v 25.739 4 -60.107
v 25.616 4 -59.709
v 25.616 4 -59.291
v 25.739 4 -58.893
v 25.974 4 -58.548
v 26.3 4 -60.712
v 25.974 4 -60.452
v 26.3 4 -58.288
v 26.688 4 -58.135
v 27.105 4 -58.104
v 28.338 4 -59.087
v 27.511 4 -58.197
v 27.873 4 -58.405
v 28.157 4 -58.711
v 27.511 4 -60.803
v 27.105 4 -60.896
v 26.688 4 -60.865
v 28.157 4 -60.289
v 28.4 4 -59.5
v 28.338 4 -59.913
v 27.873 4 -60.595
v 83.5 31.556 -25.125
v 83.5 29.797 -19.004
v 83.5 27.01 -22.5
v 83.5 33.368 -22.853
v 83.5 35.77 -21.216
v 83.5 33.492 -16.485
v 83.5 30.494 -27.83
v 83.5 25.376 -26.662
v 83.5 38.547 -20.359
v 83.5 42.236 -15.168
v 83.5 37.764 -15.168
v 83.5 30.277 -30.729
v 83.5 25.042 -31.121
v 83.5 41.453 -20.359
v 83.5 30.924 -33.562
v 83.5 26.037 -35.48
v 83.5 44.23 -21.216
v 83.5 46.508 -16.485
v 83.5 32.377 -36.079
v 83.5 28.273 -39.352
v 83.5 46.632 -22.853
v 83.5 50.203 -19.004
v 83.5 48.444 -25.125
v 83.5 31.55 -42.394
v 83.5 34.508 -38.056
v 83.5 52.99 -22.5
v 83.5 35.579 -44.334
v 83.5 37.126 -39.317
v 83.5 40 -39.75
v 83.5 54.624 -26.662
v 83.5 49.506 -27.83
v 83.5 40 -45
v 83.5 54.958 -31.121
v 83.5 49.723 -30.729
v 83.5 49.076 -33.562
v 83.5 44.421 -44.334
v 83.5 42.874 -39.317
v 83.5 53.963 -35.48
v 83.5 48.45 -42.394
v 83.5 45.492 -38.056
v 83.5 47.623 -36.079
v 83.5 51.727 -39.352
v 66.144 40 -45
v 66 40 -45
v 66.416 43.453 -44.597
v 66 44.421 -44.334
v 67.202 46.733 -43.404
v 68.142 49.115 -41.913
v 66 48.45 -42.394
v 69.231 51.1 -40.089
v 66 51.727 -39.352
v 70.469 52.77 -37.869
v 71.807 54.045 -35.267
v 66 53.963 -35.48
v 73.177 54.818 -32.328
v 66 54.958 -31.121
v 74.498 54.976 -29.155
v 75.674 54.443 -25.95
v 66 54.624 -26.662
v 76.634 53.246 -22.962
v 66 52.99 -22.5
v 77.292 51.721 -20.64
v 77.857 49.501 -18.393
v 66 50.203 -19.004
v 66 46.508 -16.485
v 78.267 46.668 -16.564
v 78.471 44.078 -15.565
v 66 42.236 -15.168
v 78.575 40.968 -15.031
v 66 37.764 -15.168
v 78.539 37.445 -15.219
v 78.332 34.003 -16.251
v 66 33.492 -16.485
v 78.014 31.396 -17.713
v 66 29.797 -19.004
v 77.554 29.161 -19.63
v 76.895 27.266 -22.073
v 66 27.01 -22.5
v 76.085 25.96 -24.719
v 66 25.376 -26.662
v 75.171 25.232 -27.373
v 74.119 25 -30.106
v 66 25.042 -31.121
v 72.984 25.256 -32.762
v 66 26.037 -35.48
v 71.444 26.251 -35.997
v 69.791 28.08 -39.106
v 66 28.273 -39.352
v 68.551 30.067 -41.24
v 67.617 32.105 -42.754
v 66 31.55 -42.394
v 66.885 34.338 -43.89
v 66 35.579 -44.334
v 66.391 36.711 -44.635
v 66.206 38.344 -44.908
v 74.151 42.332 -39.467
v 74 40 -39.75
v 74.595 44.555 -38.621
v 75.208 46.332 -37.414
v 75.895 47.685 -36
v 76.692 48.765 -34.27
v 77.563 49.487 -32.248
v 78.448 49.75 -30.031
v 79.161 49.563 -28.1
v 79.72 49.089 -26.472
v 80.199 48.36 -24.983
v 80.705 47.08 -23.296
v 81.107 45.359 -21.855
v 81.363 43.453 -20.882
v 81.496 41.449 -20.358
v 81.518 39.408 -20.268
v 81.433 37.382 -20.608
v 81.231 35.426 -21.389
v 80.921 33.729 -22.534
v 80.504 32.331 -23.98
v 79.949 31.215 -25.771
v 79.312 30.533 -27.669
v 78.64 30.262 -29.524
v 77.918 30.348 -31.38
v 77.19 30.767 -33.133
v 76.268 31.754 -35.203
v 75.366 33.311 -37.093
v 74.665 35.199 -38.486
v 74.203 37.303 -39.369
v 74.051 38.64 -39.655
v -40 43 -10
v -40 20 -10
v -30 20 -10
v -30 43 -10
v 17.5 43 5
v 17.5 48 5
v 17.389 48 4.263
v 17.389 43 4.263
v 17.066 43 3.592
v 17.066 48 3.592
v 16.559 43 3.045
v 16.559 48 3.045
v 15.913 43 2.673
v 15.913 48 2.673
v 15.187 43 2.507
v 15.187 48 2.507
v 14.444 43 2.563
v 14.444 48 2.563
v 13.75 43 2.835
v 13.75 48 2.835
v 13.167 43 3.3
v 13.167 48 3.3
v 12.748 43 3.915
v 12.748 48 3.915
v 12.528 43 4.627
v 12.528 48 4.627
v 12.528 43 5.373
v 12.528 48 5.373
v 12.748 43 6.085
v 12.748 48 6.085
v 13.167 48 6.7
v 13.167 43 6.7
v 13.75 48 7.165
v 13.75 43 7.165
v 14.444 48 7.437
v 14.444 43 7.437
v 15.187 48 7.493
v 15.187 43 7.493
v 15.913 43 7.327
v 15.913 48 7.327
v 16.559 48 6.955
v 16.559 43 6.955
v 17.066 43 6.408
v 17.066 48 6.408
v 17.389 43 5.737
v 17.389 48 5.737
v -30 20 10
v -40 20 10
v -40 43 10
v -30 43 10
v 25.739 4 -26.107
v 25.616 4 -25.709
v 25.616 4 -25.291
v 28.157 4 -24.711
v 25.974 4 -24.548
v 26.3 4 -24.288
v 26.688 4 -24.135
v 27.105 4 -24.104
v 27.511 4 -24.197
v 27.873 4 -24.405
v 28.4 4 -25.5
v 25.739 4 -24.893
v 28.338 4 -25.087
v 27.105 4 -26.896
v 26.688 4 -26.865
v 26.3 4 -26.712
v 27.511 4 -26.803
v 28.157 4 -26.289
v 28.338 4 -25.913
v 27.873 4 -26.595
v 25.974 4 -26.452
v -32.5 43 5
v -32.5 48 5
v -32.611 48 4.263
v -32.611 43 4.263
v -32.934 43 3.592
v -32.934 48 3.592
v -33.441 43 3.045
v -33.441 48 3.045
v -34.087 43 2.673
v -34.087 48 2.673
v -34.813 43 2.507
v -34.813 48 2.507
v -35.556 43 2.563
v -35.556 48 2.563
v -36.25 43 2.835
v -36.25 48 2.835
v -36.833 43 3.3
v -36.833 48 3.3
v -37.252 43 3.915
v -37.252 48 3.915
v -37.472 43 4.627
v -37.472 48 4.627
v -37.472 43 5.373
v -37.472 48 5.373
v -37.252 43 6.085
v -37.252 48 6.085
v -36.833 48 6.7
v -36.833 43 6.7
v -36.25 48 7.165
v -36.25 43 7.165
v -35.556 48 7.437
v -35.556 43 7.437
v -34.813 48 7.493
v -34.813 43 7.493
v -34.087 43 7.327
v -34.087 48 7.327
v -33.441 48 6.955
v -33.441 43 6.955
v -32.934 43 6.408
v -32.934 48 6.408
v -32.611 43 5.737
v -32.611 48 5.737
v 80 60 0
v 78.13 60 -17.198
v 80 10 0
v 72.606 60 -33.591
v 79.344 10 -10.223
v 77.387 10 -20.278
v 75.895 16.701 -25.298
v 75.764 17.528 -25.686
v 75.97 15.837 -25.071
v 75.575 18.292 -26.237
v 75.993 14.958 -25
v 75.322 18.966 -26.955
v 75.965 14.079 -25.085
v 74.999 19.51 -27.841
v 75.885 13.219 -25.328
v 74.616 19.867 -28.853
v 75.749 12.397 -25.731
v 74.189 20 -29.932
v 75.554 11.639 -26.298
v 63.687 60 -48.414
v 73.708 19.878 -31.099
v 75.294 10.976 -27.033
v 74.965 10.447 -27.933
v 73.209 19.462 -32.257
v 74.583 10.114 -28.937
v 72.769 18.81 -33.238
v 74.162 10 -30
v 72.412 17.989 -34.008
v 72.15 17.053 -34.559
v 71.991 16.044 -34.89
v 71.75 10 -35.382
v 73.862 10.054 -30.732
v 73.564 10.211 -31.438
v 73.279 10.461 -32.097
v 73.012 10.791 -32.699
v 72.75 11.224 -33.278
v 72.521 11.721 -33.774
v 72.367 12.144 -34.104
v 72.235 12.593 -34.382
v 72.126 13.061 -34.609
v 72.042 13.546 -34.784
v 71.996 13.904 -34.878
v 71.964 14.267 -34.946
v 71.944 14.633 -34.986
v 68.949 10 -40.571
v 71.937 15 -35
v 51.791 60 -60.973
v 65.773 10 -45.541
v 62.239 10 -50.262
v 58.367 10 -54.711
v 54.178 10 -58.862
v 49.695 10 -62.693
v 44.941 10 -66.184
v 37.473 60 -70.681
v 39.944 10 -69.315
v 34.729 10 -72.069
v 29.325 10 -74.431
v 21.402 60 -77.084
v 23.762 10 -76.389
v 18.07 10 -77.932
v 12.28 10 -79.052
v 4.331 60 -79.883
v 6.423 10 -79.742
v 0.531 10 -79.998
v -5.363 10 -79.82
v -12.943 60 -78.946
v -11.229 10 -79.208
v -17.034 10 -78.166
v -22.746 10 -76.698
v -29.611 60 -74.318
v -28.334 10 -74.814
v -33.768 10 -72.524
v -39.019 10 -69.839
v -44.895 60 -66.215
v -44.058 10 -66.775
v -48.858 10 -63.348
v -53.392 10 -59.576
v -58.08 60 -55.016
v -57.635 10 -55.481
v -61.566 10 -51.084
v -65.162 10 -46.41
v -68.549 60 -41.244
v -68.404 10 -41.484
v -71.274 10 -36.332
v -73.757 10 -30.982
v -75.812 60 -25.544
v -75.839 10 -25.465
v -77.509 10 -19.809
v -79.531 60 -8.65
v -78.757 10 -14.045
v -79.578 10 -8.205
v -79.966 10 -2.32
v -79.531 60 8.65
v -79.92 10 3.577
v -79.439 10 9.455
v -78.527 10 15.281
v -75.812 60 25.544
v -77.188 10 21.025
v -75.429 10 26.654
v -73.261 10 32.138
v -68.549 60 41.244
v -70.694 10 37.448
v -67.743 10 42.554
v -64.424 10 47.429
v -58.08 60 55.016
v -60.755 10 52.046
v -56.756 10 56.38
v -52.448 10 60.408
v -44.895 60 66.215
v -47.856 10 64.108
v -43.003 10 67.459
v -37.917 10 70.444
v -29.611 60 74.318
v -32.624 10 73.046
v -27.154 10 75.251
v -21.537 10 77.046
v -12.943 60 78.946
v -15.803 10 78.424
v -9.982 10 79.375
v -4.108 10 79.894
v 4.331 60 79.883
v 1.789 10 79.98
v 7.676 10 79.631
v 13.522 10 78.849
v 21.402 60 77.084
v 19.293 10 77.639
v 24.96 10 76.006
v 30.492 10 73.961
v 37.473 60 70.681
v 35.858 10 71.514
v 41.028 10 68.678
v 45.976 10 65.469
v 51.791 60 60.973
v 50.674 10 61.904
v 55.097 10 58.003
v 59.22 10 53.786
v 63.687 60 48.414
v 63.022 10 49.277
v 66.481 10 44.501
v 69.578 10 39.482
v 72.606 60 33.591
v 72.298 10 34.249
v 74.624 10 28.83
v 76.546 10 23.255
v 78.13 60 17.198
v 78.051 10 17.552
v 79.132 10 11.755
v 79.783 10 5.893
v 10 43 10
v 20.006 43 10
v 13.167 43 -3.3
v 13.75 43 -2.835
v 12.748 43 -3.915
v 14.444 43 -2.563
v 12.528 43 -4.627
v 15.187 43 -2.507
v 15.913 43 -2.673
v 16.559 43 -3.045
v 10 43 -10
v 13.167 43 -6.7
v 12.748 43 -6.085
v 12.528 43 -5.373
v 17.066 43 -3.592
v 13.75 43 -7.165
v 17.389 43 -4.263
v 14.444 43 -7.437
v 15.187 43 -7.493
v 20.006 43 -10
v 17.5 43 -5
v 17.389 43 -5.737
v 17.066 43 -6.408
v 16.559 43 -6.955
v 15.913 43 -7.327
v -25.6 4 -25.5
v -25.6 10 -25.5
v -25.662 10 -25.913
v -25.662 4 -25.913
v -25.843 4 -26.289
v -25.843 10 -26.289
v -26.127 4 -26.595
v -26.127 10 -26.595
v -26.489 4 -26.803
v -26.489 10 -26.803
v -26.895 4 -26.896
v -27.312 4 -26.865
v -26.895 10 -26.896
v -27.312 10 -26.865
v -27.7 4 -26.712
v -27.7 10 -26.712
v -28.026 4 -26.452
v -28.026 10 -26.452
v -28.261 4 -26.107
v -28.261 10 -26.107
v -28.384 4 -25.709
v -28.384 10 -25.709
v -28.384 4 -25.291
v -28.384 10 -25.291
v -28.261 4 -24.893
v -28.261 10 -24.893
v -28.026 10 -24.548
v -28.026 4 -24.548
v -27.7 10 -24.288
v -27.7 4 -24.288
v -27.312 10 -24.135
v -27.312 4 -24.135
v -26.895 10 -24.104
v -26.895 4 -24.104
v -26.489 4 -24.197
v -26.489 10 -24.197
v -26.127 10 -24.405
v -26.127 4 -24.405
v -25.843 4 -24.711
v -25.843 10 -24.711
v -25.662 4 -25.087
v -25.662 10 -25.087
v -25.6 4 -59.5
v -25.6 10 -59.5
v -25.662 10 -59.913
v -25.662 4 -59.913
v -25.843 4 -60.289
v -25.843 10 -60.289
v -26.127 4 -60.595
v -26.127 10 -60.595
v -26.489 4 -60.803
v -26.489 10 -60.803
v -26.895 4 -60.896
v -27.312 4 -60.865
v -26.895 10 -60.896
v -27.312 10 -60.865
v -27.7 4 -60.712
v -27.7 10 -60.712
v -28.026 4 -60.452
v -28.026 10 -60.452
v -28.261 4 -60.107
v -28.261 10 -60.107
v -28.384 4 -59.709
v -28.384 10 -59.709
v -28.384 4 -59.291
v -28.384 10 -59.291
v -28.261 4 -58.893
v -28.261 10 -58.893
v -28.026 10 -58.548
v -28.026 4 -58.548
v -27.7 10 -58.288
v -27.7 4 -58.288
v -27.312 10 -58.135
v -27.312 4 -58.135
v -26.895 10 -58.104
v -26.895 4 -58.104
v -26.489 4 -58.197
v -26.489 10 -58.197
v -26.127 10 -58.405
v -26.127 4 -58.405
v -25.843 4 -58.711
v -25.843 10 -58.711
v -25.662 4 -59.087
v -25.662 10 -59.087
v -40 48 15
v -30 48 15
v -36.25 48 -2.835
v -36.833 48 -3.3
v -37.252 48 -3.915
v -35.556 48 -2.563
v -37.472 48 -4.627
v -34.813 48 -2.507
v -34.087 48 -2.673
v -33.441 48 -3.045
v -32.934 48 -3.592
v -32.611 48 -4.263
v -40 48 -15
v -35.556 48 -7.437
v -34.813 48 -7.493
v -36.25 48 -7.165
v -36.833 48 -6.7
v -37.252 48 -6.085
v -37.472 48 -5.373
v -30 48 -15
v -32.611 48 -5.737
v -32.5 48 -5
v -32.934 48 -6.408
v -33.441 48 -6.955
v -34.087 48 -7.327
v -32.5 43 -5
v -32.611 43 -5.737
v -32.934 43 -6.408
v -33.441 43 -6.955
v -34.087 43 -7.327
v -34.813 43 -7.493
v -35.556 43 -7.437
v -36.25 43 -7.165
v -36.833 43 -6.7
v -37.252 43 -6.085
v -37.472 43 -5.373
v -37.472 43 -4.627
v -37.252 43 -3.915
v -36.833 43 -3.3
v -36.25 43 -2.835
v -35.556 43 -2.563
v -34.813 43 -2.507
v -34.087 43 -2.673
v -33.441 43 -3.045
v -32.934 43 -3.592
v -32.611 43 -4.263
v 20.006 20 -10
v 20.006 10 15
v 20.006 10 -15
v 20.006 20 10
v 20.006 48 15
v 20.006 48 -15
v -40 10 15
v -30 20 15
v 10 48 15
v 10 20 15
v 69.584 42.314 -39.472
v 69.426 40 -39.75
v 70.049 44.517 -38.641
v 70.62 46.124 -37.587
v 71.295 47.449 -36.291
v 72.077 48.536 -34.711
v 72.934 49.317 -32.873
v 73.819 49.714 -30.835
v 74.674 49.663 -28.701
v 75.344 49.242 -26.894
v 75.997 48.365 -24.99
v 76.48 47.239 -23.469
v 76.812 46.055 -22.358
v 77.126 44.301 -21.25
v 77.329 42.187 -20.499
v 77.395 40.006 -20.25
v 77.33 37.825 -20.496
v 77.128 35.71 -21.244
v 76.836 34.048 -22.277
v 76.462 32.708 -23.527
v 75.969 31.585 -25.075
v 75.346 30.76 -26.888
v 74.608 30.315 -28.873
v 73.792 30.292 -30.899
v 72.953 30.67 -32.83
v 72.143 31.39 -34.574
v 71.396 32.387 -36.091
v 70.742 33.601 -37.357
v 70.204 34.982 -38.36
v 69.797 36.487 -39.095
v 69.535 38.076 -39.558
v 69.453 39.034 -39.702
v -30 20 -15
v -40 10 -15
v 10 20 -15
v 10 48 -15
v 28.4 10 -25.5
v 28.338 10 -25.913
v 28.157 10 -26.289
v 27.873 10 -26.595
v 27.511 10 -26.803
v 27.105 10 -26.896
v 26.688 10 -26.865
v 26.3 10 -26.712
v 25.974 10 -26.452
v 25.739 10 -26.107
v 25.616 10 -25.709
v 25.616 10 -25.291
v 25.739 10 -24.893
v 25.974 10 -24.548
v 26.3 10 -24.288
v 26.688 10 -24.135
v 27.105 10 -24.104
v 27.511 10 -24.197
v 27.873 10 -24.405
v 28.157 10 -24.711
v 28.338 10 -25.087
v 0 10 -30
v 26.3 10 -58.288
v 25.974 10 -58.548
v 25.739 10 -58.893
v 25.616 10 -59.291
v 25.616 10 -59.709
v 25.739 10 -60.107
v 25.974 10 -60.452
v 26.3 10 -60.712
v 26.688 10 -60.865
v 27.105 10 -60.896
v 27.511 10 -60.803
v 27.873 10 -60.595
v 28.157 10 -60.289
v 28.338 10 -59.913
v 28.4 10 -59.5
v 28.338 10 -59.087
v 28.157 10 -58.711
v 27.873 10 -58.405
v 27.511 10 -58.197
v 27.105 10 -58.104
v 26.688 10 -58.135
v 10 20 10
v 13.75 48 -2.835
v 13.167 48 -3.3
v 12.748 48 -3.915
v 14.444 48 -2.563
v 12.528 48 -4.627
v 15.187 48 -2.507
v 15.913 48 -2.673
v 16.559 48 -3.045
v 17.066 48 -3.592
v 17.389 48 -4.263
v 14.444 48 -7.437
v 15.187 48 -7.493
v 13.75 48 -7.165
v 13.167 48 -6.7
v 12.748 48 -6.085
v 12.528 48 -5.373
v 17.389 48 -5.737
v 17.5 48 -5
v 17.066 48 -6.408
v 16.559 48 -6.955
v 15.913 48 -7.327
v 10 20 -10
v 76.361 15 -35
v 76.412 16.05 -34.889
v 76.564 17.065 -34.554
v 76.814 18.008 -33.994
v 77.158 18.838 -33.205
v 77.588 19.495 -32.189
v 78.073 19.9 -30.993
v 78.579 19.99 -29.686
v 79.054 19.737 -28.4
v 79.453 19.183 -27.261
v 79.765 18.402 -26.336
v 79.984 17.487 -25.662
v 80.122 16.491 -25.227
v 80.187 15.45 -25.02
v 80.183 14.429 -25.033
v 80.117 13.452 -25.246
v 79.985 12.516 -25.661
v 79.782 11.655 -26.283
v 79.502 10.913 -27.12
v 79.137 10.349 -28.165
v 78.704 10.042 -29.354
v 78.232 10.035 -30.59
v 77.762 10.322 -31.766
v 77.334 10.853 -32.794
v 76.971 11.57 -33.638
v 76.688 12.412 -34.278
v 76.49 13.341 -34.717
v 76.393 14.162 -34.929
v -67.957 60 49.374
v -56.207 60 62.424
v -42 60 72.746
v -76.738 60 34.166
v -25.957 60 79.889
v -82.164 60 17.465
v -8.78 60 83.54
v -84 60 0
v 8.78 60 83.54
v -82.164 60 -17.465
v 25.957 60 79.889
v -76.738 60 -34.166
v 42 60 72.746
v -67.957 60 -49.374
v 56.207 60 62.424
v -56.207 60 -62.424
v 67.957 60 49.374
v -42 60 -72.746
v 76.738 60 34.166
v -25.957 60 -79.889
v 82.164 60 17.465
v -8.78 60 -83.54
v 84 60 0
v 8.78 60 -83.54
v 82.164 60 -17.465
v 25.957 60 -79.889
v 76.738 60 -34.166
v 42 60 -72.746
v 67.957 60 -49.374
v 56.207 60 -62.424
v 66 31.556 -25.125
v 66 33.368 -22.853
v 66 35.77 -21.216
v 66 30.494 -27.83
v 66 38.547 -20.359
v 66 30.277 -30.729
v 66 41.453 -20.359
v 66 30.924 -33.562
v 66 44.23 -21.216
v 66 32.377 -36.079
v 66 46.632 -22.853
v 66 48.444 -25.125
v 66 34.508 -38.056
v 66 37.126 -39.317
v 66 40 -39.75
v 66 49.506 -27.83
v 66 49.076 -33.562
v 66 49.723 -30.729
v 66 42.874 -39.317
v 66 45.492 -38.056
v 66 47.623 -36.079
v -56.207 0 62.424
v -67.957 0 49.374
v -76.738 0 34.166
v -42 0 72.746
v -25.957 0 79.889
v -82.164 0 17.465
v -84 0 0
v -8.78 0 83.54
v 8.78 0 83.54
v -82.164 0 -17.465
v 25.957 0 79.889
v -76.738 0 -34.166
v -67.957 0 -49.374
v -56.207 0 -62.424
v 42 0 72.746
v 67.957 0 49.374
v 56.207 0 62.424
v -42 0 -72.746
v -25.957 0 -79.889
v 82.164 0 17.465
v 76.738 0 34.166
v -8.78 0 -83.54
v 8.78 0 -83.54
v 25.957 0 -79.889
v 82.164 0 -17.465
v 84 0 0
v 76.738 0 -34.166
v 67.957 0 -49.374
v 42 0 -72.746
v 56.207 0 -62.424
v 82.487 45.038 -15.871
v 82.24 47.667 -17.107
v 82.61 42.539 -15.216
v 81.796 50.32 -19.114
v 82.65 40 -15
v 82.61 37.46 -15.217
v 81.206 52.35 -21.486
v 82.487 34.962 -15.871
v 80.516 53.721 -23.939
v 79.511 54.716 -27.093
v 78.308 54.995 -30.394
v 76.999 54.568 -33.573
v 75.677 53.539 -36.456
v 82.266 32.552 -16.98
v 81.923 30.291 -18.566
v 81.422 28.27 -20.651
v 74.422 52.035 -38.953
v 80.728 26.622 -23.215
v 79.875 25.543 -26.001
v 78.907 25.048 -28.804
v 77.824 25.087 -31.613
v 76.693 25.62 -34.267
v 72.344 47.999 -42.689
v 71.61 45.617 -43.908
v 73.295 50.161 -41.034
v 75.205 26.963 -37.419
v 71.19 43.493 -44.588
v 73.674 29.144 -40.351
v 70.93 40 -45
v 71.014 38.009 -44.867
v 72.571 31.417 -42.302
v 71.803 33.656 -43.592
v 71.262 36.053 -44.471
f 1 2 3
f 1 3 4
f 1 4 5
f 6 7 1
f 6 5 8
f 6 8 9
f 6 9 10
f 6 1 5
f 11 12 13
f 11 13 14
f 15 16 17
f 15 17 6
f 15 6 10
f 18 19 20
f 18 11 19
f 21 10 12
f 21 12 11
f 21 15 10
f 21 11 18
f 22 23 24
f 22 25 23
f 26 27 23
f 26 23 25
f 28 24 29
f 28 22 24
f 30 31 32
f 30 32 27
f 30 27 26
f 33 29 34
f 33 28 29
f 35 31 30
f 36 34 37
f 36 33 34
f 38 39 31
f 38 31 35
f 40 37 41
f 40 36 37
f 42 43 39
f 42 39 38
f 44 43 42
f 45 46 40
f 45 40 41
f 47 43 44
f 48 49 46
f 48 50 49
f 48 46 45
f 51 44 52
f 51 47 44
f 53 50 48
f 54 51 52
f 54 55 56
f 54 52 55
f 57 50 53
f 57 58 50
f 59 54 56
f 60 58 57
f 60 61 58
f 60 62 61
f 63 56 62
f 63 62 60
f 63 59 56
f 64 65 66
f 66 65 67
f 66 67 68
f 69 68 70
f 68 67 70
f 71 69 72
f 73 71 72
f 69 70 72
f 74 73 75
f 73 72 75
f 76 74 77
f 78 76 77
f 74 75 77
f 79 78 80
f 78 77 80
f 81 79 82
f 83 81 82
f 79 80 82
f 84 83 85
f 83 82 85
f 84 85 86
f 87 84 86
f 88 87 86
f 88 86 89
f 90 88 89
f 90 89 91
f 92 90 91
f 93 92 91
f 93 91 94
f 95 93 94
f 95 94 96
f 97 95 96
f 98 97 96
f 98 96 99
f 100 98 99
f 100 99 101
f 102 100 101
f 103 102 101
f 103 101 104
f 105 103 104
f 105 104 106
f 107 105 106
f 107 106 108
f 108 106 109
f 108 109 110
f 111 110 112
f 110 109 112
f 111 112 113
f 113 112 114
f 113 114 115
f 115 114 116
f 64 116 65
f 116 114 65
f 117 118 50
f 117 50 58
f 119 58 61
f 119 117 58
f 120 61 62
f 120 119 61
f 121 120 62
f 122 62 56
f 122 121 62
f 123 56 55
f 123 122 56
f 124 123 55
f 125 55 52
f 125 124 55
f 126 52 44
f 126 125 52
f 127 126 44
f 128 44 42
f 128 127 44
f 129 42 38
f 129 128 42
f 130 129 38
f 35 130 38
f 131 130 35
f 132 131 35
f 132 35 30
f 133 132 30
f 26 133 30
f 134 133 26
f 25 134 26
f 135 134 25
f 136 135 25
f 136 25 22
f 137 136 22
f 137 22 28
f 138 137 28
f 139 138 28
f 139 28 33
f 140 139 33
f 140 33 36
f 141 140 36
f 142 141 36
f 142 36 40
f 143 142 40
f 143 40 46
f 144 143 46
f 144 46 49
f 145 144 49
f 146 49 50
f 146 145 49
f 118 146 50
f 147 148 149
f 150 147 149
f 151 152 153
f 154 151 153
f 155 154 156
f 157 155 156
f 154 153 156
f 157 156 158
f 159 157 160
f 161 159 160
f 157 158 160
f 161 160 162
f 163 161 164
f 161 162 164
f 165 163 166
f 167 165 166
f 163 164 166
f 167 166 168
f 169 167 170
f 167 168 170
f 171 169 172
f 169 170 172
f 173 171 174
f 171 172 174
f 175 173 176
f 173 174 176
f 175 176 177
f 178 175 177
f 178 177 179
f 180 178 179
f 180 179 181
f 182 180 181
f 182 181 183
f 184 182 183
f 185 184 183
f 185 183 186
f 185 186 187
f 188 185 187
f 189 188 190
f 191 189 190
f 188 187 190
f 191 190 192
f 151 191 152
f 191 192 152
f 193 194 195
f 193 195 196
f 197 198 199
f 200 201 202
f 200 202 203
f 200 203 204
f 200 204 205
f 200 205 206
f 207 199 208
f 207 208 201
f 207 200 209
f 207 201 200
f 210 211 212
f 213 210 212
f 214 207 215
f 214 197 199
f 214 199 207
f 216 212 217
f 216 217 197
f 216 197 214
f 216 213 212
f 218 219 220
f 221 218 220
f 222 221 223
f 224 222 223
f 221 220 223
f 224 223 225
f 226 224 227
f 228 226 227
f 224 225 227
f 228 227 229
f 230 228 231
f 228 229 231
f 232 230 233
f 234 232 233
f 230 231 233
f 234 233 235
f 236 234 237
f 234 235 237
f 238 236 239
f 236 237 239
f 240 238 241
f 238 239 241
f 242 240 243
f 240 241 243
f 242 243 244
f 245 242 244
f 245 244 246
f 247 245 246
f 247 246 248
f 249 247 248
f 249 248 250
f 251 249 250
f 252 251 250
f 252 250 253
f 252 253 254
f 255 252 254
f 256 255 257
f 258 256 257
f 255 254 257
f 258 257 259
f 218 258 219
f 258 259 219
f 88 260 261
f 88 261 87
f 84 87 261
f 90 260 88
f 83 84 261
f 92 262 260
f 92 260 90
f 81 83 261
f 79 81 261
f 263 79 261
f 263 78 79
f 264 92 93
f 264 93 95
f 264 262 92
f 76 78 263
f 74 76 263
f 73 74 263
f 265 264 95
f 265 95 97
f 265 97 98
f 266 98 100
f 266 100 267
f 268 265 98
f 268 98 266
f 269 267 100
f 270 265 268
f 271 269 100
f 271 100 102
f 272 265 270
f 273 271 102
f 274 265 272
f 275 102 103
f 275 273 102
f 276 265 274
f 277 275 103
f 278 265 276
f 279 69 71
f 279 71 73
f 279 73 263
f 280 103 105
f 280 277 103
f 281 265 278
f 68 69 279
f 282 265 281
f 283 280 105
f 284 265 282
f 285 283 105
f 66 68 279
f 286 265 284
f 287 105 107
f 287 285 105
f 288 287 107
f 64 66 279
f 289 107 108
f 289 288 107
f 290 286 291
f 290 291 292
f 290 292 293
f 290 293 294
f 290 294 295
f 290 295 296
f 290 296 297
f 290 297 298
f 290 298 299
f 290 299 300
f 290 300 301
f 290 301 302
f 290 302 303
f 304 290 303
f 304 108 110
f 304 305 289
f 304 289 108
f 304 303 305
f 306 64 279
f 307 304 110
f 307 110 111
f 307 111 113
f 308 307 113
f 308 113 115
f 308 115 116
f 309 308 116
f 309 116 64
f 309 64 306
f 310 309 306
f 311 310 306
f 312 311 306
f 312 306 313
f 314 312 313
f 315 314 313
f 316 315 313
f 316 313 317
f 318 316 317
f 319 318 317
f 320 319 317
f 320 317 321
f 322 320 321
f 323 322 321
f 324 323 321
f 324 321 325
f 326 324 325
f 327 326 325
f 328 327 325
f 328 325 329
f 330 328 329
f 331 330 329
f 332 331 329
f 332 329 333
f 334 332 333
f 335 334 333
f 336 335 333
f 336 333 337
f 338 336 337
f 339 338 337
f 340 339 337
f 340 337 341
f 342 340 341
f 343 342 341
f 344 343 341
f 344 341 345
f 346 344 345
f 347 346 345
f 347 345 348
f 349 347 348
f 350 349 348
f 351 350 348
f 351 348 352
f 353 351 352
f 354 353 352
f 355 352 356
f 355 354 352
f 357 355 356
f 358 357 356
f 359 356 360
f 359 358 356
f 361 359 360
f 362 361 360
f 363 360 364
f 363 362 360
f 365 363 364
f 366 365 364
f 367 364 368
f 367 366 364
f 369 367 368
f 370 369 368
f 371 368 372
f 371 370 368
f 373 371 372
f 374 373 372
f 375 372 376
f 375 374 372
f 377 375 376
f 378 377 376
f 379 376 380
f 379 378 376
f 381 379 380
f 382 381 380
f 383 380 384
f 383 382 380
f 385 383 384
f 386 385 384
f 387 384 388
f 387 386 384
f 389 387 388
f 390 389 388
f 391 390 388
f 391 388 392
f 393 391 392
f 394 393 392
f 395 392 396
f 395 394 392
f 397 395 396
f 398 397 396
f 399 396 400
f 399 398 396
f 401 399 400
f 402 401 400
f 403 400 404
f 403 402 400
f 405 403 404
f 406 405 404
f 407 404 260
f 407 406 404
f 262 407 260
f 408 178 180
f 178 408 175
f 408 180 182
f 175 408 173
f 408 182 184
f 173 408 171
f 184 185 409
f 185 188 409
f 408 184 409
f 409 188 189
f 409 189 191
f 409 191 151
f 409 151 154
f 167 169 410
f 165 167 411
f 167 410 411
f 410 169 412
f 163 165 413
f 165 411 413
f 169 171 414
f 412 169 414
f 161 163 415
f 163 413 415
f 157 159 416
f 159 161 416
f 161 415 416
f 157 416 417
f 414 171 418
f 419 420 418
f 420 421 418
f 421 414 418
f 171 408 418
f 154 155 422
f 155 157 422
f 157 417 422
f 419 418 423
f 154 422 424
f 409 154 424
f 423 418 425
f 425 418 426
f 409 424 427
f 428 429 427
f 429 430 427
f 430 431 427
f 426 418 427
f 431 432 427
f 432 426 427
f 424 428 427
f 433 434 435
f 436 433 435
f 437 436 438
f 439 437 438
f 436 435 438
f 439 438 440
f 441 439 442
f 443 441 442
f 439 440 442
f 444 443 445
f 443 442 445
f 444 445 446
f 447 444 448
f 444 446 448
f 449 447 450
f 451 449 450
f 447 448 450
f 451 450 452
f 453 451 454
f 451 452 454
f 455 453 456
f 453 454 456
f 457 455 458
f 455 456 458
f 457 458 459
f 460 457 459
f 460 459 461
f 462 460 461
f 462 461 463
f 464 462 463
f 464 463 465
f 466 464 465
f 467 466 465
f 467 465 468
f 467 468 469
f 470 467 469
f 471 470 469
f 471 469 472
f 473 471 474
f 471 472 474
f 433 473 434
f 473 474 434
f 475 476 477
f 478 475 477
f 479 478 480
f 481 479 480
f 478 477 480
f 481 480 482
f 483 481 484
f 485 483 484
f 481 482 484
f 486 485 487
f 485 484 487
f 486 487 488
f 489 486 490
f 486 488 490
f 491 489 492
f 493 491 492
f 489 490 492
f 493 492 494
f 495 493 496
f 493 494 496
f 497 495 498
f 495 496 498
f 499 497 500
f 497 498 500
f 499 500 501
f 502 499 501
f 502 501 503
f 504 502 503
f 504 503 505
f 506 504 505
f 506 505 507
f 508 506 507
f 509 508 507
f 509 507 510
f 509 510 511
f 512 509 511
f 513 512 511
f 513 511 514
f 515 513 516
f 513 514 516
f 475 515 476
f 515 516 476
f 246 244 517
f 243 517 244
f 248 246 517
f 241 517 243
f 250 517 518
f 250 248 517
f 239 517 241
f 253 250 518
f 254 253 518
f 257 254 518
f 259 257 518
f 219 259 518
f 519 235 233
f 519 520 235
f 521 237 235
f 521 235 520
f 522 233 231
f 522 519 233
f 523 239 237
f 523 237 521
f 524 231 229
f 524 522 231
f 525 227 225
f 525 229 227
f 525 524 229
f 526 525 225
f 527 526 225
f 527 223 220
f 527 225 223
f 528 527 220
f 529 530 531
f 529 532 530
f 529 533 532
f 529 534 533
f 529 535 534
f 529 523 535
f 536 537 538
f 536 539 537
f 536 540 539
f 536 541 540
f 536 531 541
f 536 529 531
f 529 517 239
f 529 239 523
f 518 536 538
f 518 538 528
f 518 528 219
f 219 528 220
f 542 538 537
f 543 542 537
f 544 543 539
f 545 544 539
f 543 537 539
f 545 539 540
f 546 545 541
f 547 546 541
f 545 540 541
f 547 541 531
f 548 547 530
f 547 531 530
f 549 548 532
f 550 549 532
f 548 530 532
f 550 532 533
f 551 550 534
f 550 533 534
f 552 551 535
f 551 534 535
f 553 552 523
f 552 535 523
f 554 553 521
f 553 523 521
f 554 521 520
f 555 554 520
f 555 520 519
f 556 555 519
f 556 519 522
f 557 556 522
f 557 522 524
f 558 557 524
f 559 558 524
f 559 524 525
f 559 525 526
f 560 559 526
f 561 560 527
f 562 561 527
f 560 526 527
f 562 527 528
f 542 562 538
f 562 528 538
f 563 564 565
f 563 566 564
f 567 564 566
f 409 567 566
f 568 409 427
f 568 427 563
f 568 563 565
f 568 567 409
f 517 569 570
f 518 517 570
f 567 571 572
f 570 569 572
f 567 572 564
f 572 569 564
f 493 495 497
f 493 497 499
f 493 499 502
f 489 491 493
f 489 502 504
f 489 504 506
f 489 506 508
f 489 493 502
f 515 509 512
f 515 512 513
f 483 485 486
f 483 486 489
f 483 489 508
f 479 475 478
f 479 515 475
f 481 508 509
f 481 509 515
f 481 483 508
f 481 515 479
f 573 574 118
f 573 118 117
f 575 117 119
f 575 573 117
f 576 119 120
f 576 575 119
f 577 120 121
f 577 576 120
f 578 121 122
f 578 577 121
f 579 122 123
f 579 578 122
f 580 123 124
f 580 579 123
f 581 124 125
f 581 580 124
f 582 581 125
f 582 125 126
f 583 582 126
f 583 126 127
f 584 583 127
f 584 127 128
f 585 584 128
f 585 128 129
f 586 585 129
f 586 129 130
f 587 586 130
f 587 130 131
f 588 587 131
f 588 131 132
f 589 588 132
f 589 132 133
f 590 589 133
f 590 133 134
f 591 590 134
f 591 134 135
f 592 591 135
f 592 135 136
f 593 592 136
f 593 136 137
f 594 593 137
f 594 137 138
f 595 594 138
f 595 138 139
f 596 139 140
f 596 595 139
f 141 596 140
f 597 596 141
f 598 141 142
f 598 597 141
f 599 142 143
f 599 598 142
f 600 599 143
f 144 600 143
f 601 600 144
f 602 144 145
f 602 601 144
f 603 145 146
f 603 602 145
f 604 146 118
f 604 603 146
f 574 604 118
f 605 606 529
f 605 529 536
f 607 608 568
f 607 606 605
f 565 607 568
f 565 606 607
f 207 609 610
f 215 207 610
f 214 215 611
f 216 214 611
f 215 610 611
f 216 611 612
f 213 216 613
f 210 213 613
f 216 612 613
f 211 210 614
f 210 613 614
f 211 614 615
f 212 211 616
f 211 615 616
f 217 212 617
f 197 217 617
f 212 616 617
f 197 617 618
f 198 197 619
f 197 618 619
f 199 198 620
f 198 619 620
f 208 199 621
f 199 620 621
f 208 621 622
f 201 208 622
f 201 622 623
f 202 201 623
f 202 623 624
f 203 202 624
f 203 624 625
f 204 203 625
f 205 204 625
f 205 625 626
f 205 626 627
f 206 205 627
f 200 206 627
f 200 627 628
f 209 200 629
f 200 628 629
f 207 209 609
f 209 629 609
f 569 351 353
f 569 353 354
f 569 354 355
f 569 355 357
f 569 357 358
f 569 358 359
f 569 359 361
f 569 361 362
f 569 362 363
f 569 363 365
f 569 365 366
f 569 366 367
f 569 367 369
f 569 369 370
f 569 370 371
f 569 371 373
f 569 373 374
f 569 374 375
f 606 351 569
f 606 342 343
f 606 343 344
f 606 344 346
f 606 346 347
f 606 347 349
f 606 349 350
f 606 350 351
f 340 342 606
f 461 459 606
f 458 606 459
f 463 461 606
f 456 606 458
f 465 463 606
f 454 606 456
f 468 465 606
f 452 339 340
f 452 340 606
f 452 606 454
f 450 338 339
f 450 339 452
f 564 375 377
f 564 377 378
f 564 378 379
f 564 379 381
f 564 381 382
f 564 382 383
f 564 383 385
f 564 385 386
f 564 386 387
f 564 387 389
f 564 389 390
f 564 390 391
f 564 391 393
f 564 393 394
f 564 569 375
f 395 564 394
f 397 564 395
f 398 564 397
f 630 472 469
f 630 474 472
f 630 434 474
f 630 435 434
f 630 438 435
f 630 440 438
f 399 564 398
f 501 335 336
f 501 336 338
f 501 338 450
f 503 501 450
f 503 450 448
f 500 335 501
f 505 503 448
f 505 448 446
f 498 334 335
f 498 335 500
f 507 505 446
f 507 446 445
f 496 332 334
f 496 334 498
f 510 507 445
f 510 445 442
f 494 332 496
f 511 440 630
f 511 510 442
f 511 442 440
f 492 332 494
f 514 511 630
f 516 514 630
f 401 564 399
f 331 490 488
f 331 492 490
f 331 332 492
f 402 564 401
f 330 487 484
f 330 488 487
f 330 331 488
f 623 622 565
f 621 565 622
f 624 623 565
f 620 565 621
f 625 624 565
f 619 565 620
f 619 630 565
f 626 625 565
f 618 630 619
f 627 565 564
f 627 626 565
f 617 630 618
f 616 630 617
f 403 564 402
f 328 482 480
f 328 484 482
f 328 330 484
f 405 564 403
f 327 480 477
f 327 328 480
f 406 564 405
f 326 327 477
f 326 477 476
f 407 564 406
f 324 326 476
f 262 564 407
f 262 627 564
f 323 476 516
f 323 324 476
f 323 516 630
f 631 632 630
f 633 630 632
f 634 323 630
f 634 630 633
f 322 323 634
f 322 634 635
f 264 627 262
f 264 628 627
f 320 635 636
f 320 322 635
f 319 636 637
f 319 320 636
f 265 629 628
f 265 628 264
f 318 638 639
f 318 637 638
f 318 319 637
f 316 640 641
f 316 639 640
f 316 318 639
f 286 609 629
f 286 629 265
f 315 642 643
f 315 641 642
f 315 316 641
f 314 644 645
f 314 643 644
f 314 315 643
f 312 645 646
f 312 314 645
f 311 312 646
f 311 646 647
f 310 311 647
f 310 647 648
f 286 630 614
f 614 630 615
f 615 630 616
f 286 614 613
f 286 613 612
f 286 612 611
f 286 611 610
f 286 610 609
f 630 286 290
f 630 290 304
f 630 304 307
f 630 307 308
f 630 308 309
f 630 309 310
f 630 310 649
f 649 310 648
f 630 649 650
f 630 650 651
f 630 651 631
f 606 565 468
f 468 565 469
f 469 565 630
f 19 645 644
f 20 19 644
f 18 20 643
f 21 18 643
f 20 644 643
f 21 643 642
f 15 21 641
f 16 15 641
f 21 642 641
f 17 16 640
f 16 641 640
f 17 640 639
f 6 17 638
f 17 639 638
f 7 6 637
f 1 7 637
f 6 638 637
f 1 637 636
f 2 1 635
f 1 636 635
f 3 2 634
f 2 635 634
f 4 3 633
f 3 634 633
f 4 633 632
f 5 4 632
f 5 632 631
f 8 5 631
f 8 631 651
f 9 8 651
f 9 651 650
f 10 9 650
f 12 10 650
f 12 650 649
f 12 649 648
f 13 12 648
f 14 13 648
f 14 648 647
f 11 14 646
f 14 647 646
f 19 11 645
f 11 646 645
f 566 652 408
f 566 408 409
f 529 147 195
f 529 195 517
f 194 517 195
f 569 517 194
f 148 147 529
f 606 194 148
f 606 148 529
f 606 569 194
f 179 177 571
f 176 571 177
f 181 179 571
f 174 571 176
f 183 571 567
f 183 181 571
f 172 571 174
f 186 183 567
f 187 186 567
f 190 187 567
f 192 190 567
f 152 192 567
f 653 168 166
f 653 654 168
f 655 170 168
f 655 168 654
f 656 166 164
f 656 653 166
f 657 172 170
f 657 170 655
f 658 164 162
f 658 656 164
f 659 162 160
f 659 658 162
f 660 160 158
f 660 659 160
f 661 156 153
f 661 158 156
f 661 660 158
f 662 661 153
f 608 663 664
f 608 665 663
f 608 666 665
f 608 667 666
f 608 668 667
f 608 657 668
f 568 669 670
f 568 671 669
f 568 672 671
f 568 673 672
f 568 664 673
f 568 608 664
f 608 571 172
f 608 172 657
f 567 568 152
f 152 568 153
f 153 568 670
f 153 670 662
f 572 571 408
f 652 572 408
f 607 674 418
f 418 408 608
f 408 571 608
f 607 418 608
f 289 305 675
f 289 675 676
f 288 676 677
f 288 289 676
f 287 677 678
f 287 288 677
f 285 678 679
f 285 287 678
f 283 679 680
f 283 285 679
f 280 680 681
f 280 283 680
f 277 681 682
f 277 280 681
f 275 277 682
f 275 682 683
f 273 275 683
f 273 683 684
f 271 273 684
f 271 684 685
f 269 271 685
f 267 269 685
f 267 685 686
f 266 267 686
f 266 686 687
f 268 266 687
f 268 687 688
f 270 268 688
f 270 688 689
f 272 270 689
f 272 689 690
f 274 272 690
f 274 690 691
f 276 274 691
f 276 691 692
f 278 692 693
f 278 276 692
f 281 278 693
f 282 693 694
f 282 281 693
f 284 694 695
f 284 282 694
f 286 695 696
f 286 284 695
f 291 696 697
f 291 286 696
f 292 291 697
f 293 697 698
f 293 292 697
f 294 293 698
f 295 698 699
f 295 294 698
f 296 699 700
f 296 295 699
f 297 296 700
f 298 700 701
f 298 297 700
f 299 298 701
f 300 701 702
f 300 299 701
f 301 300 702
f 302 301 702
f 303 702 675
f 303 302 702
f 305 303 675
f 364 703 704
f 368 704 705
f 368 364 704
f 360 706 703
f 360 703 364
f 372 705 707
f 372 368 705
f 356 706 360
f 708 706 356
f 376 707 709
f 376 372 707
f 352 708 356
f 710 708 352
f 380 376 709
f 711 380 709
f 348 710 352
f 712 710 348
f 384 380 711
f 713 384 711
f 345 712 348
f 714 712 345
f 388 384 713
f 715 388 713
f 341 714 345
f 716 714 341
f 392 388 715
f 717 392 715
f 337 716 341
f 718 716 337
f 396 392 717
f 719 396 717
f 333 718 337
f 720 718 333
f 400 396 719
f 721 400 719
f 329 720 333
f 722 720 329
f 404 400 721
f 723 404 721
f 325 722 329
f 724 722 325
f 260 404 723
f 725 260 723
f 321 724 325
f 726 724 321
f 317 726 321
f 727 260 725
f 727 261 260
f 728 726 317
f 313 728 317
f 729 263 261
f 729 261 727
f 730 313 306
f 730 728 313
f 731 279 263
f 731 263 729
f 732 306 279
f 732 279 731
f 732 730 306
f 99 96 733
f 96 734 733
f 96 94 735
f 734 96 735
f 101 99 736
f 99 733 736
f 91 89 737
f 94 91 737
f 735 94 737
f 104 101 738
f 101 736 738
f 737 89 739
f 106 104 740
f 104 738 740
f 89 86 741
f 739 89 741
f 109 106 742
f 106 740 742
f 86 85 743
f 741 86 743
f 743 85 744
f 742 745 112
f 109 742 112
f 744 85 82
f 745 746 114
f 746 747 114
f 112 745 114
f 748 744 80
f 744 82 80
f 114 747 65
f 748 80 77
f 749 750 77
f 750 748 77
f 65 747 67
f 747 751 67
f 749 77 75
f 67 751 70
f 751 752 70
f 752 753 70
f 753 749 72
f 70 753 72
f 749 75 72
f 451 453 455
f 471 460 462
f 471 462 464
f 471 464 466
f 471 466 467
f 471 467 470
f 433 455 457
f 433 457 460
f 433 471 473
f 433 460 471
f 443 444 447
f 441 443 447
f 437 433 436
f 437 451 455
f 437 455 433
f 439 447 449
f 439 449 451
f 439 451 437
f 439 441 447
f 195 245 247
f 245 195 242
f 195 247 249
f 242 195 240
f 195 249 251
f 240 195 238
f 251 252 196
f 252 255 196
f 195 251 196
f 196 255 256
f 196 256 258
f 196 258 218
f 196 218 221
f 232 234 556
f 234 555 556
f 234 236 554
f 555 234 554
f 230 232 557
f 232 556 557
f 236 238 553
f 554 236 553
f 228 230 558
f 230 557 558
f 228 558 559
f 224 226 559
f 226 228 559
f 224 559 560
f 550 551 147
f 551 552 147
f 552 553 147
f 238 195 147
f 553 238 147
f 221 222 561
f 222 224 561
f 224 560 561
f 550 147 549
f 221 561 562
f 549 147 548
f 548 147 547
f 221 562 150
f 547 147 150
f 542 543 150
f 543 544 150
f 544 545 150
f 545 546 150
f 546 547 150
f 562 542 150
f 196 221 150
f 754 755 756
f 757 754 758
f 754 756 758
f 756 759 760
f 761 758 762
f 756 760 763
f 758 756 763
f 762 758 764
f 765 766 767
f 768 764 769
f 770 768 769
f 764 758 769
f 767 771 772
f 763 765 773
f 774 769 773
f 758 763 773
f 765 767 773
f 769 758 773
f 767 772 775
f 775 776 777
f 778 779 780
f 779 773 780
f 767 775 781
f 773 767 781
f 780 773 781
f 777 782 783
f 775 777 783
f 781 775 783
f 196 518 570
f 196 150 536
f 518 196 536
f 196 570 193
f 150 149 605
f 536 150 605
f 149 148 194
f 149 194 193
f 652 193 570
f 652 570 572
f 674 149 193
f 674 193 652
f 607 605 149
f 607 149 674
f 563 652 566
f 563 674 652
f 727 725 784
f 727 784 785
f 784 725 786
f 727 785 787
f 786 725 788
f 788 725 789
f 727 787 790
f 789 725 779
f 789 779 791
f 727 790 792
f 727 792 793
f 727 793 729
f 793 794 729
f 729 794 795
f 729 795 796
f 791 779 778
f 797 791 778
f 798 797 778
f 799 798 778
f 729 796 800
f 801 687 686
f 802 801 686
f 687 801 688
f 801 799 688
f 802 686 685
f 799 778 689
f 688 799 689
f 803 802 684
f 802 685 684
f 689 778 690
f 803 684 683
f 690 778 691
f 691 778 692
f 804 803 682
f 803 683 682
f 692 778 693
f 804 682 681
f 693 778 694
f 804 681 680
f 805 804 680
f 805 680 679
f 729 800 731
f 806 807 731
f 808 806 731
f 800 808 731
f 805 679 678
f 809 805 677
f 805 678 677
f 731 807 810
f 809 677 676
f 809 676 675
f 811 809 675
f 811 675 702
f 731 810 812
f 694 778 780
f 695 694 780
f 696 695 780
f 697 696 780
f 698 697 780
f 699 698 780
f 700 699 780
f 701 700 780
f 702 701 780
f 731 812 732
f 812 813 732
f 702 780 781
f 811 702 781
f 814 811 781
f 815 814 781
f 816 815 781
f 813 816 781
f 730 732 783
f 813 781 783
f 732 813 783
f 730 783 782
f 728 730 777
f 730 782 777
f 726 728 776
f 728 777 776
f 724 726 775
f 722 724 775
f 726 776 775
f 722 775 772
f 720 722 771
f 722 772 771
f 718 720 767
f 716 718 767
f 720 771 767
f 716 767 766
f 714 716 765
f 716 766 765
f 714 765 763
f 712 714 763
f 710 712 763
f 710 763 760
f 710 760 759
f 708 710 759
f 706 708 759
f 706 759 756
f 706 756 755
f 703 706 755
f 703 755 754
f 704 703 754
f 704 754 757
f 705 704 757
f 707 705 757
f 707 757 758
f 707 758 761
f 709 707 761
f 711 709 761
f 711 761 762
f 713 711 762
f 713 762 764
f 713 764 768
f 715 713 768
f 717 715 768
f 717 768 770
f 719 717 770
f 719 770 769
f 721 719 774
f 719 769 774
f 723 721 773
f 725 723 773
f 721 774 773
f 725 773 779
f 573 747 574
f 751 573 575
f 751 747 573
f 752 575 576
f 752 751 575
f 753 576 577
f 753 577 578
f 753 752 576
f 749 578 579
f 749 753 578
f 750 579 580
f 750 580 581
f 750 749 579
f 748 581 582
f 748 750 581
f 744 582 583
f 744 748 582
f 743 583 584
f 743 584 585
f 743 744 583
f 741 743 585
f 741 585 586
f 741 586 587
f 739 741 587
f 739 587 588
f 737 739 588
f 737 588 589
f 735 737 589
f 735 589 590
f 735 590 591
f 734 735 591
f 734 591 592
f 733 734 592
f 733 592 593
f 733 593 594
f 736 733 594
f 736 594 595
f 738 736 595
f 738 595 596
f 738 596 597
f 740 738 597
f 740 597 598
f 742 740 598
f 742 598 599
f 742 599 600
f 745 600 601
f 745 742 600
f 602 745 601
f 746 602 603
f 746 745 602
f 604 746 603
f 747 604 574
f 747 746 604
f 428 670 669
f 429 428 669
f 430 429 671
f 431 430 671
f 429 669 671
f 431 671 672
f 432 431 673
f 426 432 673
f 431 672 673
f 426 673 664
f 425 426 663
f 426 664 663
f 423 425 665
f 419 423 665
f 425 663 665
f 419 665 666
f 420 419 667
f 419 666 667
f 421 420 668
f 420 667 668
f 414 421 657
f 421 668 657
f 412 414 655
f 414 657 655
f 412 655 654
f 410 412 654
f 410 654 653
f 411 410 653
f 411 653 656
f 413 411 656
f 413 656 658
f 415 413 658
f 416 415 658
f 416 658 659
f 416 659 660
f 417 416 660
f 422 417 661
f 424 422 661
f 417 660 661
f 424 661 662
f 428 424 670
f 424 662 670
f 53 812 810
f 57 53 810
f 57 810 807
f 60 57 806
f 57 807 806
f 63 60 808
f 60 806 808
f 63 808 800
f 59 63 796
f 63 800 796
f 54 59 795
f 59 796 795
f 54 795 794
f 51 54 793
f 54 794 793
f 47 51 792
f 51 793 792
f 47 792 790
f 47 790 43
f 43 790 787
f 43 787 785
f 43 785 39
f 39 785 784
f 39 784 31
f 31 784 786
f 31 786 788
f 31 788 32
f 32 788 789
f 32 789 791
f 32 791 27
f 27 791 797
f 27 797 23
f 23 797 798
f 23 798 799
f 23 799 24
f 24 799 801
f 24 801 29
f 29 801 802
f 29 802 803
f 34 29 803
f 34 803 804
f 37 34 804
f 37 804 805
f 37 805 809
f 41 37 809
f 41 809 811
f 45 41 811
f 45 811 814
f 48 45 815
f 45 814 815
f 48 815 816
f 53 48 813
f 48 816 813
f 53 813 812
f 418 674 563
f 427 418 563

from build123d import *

# Parameters (mm, degrees)
SKETCH1_R                   = 84
BASE_DEPTH                  = 10
SKETCH2_R                   = 84
SKETCH2_R_2                 = 80
WALLS_DEPTH                 = 50
SKETCH3_W                   = 10.006475694
SKETCH3_H                   = 5
MOTOR_MOUNT_1_DEPTH         = 38
SKETCH3_5_W                 = 10
SKETCH3_5_H                 = 5
MOTOR_MOUNT_2_DEPTH         = 38
SKETCH6_W                   = 10.006475694
SKETCH6_H                   = 20
SKETCH6_R                   = 2.5
SKETCH6_W_2                 = 10
MOTOR_SCREW_HOLES_DEPTH     = 5
SKETCH7_R                   = 1.4
PERFBOARD_SCREW_HOLES_DEPTH = 6
BOSS_EXTRUDE1_DEPTH         = 10
SKETCH10_R                  = 9.75
SKETCH10_R_2                = 5
CUT_EXTRUDE1_DEPTH          = 134.086438077
BOSS_EXTRUDE2_START         = 66
SKETCH10_3_R                = 15
SKETCH10_3_R_2              = 9.75
BOSS_EXTRUDE2_DEPTH         = 17.5


with BuildPart() as part:
    # Sketch1 → base (new body)
    with BuildSketch(Plane(origin=(0, 0, 0), x_dir=(1, 0, 0), z_dir=(0, 1, 0))):
        Circle(SKETCH1_R)
    extrude(amount=BASE_DEPTH)

    # Sketch2 → walls (add)
    with BuildSketch(Plane(origin=(0, 10, 0), x_dir=(1, 0, 0), z_dir=(0, 1, 0))):
        Circle(SKETCH2_R)
        Circle(SKETCH2_R_2, mode=Mode.SUBTRACT)
    extrude(amount=WALLS_DEPTH)

    # Sketch3 → motor mount 1 (add)
    with BuildSketch(Plane(origin=(0, 10, 0), x_dir=(1, 0, 0), z_dir=(0, 1, 0))):
        with Locations((15.003237847, -12.5)):
            Rectangle(SKETCH3_W, SKETCH3_H)
        with Locations((15.003237847, 12.5)):
            Rectangle(SKETCH3_W, SKETCH3_H)
    extrude(amount=MOTOR_MOUNT_1_DEPTH)

    # Sketch3<5> → motor mount 2 (add)
    with BuildSketch(Plane(origin=(0, 10, 0), x_dir=(1, 0, 0), z_dir=(0, 1, 0))):
        with Locations((-35, -12.5)):
            Rectangle(SKETCH3_5_W, SKETCH3_5_H)
        with Locations((-35, 12.5)):
            Rectangle(SKETCH3_5_W, SKETCH3_5_H)
    extrude(amount=MOTOR_MOUNT_2_DEPTH)

    # Sketch6 → motor screw holes (add)
    # profile 1 of 2: a face of its own
    with BuildSketch(Plane(origin=(0, 48, 0), x_dir=(1, 0, 0), z_dir=(0, 1, 0))):
        with Locations((15.003237847, 0)):
            Rectangle(SKETCH6_W, SKETCH6_H)
        with Locations((15, 5)):
            Circle(SKETCH6_R, mode=Mode.SUBTRACT)
        with Locations((15, -5)):
            Circle(SKETCH6_R, mode=Mode.SUBTRACT)
    # profile 2 of 2: a face of its own
    with BuildSketch(Plane(origin=(0, 48, 0), x_dir=(1, 0, 0), z_dir=(0, 1, 0))):
        with Locations((-35, 0)):
            Rectangle(SKETCH6_W_2, SKETCH6_H)
        with Locations((-35, 5)):
            Circle(SKETCH6_R, mode=Mode.SUBTRACT)
        with Locations((-35, -5)):
            Circle(SKETCH6_R, mode=Mode.SUBTRACT)
    extrude(amount=-MOTOR_SCREW_HOLES_DEPTH)

    # Sketch7 → perfboard screw holes (cut)
    with BuildSketch(Plane(origin=(0, 10, 0), x_dir=(1, 0, 0), z_dir=(0, 1, 0))):
        with Locations((-27, 59.5)):
            Circle(SKETCH7_R)
        with Locations((-27, 25.5)):
            Circle(SKETCH7_R)
        with Locations((27, 25.5)):
            Circle(SKETCH7_R)
        with Locations((27, 59.5)):
            Circle(SKETCH7_R)
    extrude(amount=-PERFBOARD_SCREW_HOLES_DEPTH, mode=Mode.SUBTRACT)

    # Sketch9 → Boss-Extrude1 (add)
    with BuildSketch(Plane(origin=(0, 10, 0), x_dir=(1, 0, 0), z_dir=(0, 1, 0))):
        Polygon((10, 15), (-30, 15), (-30, 10), (-40, 10), (-40, -10), (-30, -10), (-30, -15), (10, -15), (10, -10), (20.006475694, -10), (20.006475694, 10), (10, 10), align=None)
    extrude(amount=BOSS_EXTRUDE1_DEPTH)

    # Sketch10 → Cut-Extrude1 (cut, through all)
    with BuildSketch(Plane(origin=(0, 0, 0), x_dir=(0, 0, -1), z_dir=(1, 0, 0))):
        with Locations((30, 40)):
            Circle(SKETCH10_R)
        with Locations((30, 15)):
            Circle(SKETCH10_R_2)
    extrude(amount=CUT_EXTRUDE1_DEPTH, mode=Mode.SUBTRACT)

    # Sketch10<3> → Boss-Extrude2 (add)
    with BuildSketch(Plane(origin=(0, 0, 0), x_dir=(0, 0, -1), z_dir=(1, 0, 0)).offset(BOSS_EXTRUDE2_START)):
        with Locations((30, 40)):
            Circle(SKETCH10_3_R)
        with Locations((30, 40)):
            Circle(SKETCH10_3_R_2, mode=Mode.SUBTRACT)
    extrude(amount=BOSS_EXTRUDE2_DEPTH)


solid = part.part
